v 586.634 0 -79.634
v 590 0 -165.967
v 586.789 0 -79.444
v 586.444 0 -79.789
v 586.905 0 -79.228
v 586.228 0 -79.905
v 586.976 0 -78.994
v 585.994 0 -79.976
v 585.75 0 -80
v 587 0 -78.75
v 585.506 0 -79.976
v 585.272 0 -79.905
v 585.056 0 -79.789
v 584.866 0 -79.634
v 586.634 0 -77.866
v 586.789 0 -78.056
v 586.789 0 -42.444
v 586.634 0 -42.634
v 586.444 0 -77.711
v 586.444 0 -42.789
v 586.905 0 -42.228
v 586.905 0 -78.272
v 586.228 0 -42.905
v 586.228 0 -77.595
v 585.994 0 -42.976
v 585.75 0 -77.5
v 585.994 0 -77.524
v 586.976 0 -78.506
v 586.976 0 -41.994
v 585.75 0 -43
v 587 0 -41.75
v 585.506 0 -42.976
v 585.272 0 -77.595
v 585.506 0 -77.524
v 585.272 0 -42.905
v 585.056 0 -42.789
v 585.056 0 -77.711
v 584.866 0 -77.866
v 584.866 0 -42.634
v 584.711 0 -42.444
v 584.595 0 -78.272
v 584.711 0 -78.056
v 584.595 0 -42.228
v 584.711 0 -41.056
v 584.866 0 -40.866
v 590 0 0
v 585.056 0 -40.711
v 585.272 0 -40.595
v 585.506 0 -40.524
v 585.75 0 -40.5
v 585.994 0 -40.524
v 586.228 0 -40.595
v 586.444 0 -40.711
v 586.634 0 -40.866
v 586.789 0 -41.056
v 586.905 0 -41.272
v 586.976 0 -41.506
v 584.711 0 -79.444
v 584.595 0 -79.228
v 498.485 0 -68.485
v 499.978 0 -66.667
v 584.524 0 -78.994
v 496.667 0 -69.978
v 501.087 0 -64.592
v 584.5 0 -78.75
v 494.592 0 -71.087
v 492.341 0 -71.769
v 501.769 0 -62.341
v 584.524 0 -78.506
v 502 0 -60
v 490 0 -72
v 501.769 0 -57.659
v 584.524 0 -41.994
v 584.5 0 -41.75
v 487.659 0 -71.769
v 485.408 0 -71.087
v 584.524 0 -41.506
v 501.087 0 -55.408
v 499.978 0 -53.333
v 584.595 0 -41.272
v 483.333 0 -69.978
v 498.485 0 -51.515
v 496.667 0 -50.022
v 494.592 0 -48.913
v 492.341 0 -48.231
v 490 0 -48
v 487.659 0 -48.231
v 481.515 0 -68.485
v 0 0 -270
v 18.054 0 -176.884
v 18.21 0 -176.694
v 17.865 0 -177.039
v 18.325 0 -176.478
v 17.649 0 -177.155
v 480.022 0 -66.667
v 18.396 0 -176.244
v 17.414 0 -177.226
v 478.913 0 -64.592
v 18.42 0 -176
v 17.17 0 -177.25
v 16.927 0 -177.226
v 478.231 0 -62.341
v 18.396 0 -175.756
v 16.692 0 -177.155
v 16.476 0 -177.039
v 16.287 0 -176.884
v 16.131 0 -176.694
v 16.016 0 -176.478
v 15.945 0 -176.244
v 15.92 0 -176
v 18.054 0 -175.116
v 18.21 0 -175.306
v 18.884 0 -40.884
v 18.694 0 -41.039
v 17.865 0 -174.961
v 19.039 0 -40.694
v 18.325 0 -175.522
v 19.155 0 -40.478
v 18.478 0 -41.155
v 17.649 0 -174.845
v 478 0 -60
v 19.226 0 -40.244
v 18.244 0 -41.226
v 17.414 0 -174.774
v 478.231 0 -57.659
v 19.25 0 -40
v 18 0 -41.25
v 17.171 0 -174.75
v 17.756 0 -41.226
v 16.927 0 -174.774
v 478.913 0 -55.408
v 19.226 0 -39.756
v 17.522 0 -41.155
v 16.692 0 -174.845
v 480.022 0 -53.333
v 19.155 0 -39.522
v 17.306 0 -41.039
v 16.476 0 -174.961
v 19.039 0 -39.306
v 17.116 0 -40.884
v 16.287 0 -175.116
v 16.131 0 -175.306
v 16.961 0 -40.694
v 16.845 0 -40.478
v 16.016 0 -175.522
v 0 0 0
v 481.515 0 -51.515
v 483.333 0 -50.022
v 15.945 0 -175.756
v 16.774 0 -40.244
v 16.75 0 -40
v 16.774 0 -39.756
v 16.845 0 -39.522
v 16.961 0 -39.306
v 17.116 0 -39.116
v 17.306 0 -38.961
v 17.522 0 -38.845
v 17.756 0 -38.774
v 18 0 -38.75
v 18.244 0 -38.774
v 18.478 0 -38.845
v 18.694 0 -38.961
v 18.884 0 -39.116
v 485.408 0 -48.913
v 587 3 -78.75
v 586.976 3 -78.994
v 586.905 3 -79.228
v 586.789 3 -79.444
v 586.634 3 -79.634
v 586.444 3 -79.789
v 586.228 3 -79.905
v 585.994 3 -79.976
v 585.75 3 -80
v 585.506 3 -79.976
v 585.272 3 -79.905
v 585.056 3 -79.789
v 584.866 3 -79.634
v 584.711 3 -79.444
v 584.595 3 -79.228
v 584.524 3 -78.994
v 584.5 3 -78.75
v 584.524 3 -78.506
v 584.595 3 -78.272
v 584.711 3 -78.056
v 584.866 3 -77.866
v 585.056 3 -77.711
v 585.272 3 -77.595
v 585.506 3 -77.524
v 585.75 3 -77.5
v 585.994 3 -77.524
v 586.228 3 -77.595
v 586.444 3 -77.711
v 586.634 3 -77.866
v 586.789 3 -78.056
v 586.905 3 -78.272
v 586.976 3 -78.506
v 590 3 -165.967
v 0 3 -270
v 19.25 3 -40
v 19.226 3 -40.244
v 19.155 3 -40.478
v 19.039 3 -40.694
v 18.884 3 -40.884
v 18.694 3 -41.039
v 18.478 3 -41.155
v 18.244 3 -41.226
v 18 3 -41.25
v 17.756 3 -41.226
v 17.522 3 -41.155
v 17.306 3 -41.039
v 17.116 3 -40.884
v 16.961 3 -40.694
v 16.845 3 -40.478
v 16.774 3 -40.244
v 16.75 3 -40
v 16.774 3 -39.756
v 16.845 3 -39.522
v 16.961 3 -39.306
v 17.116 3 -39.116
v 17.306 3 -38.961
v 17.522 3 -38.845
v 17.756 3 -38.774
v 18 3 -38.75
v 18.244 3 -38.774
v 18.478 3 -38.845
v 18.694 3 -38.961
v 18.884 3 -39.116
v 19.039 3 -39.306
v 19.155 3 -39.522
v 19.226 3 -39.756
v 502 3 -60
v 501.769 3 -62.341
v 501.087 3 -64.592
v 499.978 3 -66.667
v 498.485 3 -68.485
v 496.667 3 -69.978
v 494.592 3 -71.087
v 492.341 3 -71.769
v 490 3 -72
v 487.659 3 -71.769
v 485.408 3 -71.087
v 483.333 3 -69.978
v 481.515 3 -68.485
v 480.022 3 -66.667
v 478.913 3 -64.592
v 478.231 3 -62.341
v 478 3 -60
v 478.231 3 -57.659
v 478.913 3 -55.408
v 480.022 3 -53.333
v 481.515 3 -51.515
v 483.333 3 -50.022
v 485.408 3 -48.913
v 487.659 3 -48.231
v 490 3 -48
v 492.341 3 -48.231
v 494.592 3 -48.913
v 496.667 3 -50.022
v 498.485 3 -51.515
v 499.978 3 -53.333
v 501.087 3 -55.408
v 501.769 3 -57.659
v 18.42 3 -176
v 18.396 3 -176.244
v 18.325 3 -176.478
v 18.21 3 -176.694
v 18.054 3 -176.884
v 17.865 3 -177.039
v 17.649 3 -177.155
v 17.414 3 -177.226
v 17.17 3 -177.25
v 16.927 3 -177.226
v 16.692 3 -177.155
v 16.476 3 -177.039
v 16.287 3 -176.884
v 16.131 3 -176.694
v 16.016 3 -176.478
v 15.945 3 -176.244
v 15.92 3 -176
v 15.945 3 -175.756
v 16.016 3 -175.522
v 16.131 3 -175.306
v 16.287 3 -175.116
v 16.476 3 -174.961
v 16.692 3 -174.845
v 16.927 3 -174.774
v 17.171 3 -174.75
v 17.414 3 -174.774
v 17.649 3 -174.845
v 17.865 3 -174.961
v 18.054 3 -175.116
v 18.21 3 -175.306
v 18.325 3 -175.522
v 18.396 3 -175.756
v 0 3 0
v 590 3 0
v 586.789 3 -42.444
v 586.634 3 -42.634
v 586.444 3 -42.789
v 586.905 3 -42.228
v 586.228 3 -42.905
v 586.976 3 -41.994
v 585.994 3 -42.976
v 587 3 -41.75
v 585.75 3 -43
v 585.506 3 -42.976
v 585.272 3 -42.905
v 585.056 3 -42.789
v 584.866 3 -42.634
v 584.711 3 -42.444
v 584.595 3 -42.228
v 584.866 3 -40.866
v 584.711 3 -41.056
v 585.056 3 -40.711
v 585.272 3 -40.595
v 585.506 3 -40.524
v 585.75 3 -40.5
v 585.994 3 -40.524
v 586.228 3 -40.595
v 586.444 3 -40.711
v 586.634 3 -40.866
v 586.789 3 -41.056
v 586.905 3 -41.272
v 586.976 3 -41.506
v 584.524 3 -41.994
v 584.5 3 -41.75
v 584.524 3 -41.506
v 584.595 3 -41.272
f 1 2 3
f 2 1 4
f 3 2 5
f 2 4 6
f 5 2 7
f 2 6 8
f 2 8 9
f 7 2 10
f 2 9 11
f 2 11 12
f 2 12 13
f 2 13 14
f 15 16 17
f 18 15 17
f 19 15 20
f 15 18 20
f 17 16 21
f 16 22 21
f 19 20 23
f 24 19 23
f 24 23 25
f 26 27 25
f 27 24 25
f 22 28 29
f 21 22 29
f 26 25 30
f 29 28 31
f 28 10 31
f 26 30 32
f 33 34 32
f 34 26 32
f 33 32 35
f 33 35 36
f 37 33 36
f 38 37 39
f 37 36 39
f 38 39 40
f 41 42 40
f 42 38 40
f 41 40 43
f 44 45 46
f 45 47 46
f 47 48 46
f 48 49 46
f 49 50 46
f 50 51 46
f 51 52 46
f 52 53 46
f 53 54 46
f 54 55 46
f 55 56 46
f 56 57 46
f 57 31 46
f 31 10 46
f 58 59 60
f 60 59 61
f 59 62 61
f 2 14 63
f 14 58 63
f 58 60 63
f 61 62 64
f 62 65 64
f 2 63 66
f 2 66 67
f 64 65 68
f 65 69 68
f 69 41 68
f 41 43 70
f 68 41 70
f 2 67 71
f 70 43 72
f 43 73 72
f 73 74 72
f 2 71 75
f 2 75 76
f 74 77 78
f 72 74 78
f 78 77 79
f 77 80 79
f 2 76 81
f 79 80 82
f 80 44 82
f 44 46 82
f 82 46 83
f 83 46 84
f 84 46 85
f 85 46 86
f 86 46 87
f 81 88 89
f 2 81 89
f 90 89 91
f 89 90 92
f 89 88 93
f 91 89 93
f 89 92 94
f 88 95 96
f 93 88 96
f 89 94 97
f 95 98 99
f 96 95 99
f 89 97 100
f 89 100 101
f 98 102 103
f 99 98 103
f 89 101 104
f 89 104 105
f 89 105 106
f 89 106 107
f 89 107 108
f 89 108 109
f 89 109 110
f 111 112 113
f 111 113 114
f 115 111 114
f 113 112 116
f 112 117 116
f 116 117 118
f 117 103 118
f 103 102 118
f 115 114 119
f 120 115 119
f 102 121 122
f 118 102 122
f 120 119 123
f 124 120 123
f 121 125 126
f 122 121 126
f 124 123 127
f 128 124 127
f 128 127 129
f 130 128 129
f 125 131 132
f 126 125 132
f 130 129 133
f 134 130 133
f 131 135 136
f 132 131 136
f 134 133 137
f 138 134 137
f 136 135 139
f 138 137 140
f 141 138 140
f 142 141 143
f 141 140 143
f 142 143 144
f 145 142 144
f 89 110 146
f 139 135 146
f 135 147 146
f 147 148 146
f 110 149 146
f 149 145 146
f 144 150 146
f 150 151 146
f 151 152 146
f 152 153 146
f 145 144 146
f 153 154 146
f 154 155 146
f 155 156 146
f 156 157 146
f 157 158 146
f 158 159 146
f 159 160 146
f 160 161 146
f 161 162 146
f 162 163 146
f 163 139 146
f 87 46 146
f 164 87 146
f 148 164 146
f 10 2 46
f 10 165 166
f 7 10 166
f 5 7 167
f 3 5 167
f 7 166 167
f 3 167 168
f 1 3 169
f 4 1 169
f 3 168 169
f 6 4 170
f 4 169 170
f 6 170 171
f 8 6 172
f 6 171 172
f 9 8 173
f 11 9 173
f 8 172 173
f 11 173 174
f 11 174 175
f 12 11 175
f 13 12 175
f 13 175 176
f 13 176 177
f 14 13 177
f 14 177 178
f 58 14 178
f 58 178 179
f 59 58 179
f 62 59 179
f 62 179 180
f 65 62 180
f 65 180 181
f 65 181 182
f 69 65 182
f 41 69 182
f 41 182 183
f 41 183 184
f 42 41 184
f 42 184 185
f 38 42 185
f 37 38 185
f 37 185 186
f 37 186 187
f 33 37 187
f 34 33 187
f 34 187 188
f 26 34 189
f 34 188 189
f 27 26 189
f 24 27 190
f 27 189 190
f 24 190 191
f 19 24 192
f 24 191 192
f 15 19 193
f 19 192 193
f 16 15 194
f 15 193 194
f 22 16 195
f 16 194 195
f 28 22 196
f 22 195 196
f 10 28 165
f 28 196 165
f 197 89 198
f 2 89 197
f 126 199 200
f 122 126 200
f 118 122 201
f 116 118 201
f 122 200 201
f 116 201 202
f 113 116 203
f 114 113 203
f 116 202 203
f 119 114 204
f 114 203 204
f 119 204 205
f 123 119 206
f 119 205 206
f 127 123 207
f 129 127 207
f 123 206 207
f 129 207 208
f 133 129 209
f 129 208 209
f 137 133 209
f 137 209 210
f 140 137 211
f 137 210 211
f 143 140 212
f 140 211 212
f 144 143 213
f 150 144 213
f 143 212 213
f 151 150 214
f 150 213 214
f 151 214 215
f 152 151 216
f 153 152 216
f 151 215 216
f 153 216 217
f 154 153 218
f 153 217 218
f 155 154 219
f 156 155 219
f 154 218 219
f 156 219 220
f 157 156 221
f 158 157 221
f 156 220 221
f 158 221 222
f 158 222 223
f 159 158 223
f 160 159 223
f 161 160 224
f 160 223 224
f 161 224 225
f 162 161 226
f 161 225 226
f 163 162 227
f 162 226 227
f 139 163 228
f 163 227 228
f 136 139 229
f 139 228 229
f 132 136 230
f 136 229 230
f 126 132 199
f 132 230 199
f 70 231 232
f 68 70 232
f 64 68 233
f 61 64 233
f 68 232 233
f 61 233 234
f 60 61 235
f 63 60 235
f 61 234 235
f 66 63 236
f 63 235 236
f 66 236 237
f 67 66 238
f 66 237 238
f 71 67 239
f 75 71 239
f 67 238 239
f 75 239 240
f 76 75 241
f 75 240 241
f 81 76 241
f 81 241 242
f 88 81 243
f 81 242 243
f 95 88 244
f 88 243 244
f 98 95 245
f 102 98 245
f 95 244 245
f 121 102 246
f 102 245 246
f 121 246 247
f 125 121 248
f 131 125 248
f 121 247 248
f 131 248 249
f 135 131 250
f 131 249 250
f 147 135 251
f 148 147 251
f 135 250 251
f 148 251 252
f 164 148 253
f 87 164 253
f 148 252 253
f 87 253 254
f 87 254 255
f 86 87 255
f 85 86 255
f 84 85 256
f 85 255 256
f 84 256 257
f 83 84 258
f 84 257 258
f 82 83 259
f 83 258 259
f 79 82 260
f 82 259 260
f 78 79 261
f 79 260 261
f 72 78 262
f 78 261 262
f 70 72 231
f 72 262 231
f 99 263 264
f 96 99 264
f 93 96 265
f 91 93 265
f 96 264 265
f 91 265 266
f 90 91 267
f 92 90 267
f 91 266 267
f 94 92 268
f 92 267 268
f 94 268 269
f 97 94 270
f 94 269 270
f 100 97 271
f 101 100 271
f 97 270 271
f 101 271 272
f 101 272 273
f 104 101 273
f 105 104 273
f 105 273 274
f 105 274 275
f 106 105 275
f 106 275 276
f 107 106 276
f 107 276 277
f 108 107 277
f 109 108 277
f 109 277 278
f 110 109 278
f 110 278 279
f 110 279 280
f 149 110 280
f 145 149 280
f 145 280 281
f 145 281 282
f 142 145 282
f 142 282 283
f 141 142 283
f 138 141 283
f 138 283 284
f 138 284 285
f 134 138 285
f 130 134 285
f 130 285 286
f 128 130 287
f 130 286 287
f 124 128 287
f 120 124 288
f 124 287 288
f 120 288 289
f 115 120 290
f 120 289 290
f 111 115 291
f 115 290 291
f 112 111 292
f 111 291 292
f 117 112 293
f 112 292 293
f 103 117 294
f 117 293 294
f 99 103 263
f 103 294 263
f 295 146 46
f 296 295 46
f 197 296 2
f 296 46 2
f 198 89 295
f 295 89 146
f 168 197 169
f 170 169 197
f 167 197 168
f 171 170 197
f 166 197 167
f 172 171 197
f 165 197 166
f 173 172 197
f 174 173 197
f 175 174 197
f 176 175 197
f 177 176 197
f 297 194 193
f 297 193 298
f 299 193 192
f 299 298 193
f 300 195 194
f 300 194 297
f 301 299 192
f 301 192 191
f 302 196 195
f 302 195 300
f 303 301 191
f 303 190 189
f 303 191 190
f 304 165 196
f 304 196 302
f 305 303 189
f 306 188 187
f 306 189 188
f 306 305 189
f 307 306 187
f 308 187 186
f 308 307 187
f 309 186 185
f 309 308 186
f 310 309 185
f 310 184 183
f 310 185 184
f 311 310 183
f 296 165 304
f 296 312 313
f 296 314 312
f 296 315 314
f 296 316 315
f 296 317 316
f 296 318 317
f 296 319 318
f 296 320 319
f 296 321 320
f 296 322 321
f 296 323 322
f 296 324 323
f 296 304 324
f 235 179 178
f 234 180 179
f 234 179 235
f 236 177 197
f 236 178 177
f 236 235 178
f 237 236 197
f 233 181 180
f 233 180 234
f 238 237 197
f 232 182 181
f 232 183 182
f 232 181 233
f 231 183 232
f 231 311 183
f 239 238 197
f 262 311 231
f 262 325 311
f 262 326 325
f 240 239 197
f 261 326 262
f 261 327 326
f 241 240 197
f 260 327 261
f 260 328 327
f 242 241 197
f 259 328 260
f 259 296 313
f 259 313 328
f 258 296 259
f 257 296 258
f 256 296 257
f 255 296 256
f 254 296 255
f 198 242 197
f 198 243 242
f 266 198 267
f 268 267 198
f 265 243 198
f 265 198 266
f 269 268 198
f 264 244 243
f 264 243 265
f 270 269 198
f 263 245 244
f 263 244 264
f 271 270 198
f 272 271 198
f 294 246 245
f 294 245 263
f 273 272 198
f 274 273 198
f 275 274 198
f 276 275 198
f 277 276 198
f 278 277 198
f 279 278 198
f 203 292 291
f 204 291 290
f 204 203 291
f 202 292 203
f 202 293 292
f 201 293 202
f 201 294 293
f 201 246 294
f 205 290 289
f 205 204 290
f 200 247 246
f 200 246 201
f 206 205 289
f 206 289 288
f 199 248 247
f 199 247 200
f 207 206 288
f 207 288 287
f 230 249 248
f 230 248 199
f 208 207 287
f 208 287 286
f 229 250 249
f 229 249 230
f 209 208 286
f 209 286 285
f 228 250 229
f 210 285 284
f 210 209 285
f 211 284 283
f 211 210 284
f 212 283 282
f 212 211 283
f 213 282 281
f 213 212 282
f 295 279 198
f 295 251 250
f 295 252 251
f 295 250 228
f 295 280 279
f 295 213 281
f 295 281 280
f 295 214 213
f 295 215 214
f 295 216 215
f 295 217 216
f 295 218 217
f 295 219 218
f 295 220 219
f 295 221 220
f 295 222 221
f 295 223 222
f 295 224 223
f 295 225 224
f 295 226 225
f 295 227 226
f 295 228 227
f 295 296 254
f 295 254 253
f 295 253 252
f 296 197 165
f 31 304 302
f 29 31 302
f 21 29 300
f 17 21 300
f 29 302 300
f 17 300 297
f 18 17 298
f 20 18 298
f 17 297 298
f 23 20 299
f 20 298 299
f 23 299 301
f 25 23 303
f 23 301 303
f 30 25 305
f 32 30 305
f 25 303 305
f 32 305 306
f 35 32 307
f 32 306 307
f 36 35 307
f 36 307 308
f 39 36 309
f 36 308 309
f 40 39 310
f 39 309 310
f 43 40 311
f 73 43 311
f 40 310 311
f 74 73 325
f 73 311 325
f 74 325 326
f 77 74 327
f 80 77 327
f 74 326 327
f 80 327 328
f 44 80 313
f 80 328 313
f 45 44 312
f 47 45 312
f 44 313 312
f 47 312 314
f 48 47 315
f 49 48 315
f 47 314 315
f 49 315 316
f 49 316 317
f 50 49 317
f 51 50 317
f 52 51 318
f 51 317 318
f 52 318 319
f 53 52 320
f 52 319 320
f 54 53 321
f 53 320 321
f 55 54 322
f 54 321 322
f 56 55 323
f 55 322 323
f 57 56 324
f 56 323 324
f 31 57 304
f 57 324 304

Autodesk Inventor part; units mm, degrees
ref_plane "YZ Plane" through (0, 0, 0) normal (1, 0, 0) x (0, 1, 0)
ref_plane "XZ Plane" through (0, 0, 0) normal (0, 1, 0) x (-1, 0, 0)
ref_plane "XY Plane" through (0, 0, 0) normal (0, 0, 1) x (1, 0, 0)
sketch "Sketch1" plane through (0, 0, 0) normal (0, 1, 0) x (-1, 0, 0)
  line L0 (0, 0) -> (-590, 0)
  line L1 (-590, 0) -> (-590, -165.9671)
  line L2 (-590, -165.9671) -> (0, -165.9671)
  line L3 (0, -165.9671) -> (0, 0)
  line L4 (0, -165.9671) -> (0, -270)
  line L5 (0, -270) -> (-590, -165.9671)
  dimension "d0" = 590
  dimension "d28" = 270
  dimension "d29" = 10
extrude "Extrusion1" add sketch "Sketch1" along normal blind 3
sketch "Sketch3" plane through (0, 3, 0) normal (0, 1, 0) x (1, 0, 0)
  circle A0 centre (585.75, 41.75) radius 1.25
  circle A1 centre (585.75, 78.75) radius 1.25
  line L0 (590, 0) -> (590, 165.9671) projected
  line L1 (0, 0) -> (590, 0) projected
  dimension "d15" = 2.5
  dimension "d16" = 4.25
  dimension "d17" = 4.25
  dimension "d18" = 2.5
  dimension "d19" = 41.75
  dimension "d20" = 37
extrude "Extrusion3" cut sketch "Sketch3" along normal through all both and the other way through all
sketch "Sketch4" plane through (0, 3, 0) normal (0, 1, 0) x (1, 0, 0)
  circle A0 centre (490, 60) radius 12
  line L0 (0, 0) -> (590, 0) projected
  line L1 (590, 0) -> (590, 165.9671) projected
  line L2 (14.1705, 156) -> (20.1705, 156)
  line L3 (20.1705, 156) -> (20.1705, 144)
  line L4 (20.1705, 144) -> (14.1705, 144)
  line L5 (14.1705, 144) -> (14.1705, 156)
  line L6 (15, 114) -> (21, 114)
  line L7 (21, 114) -> (21, 102)
  line L8 (21, 102) -> (15, 102)
  line L9 (15, 102) -> (15, 114)
  line L10 (15, 72) -> (21, 72)
  line L11 (21, 72) -> (21, 60)
  line L12 (21, 60) -> (15, 60)
  line L13 (15, 60) -> (15, 72)
  circle A1 centre (17.1705, 176) radius 1.25
  circle A2 centre (18, 40) radius 1.25
  line L14 (18, 60) -> (18, 40) construction
  dimension "d23" = 24
  dimension "d24" = 60
  dimension "d25" = 100
  dimension "d30" = 6
  dimension "d31" = 12
  dimension "d32" = 30
  dimension "d33" = 30
  dimension "d34" = 2.5
  dimension "d35" = 2.5
  dimension "d36" = 20
  dimension "d37" = 20
  dimension "d38" = 60
extrude "Extrusion4" cut sketch "Sketch4" against normal through all contours A0 | A1 | A2
equation "\"d16\" = d17"
equation "\"d18\" = d15"
equation "\"d33\" = d32"
equation "\"d34\" = d35"
equation "\"d37\" = d36"
properties part number "pinball-case-left-wall-outer"
